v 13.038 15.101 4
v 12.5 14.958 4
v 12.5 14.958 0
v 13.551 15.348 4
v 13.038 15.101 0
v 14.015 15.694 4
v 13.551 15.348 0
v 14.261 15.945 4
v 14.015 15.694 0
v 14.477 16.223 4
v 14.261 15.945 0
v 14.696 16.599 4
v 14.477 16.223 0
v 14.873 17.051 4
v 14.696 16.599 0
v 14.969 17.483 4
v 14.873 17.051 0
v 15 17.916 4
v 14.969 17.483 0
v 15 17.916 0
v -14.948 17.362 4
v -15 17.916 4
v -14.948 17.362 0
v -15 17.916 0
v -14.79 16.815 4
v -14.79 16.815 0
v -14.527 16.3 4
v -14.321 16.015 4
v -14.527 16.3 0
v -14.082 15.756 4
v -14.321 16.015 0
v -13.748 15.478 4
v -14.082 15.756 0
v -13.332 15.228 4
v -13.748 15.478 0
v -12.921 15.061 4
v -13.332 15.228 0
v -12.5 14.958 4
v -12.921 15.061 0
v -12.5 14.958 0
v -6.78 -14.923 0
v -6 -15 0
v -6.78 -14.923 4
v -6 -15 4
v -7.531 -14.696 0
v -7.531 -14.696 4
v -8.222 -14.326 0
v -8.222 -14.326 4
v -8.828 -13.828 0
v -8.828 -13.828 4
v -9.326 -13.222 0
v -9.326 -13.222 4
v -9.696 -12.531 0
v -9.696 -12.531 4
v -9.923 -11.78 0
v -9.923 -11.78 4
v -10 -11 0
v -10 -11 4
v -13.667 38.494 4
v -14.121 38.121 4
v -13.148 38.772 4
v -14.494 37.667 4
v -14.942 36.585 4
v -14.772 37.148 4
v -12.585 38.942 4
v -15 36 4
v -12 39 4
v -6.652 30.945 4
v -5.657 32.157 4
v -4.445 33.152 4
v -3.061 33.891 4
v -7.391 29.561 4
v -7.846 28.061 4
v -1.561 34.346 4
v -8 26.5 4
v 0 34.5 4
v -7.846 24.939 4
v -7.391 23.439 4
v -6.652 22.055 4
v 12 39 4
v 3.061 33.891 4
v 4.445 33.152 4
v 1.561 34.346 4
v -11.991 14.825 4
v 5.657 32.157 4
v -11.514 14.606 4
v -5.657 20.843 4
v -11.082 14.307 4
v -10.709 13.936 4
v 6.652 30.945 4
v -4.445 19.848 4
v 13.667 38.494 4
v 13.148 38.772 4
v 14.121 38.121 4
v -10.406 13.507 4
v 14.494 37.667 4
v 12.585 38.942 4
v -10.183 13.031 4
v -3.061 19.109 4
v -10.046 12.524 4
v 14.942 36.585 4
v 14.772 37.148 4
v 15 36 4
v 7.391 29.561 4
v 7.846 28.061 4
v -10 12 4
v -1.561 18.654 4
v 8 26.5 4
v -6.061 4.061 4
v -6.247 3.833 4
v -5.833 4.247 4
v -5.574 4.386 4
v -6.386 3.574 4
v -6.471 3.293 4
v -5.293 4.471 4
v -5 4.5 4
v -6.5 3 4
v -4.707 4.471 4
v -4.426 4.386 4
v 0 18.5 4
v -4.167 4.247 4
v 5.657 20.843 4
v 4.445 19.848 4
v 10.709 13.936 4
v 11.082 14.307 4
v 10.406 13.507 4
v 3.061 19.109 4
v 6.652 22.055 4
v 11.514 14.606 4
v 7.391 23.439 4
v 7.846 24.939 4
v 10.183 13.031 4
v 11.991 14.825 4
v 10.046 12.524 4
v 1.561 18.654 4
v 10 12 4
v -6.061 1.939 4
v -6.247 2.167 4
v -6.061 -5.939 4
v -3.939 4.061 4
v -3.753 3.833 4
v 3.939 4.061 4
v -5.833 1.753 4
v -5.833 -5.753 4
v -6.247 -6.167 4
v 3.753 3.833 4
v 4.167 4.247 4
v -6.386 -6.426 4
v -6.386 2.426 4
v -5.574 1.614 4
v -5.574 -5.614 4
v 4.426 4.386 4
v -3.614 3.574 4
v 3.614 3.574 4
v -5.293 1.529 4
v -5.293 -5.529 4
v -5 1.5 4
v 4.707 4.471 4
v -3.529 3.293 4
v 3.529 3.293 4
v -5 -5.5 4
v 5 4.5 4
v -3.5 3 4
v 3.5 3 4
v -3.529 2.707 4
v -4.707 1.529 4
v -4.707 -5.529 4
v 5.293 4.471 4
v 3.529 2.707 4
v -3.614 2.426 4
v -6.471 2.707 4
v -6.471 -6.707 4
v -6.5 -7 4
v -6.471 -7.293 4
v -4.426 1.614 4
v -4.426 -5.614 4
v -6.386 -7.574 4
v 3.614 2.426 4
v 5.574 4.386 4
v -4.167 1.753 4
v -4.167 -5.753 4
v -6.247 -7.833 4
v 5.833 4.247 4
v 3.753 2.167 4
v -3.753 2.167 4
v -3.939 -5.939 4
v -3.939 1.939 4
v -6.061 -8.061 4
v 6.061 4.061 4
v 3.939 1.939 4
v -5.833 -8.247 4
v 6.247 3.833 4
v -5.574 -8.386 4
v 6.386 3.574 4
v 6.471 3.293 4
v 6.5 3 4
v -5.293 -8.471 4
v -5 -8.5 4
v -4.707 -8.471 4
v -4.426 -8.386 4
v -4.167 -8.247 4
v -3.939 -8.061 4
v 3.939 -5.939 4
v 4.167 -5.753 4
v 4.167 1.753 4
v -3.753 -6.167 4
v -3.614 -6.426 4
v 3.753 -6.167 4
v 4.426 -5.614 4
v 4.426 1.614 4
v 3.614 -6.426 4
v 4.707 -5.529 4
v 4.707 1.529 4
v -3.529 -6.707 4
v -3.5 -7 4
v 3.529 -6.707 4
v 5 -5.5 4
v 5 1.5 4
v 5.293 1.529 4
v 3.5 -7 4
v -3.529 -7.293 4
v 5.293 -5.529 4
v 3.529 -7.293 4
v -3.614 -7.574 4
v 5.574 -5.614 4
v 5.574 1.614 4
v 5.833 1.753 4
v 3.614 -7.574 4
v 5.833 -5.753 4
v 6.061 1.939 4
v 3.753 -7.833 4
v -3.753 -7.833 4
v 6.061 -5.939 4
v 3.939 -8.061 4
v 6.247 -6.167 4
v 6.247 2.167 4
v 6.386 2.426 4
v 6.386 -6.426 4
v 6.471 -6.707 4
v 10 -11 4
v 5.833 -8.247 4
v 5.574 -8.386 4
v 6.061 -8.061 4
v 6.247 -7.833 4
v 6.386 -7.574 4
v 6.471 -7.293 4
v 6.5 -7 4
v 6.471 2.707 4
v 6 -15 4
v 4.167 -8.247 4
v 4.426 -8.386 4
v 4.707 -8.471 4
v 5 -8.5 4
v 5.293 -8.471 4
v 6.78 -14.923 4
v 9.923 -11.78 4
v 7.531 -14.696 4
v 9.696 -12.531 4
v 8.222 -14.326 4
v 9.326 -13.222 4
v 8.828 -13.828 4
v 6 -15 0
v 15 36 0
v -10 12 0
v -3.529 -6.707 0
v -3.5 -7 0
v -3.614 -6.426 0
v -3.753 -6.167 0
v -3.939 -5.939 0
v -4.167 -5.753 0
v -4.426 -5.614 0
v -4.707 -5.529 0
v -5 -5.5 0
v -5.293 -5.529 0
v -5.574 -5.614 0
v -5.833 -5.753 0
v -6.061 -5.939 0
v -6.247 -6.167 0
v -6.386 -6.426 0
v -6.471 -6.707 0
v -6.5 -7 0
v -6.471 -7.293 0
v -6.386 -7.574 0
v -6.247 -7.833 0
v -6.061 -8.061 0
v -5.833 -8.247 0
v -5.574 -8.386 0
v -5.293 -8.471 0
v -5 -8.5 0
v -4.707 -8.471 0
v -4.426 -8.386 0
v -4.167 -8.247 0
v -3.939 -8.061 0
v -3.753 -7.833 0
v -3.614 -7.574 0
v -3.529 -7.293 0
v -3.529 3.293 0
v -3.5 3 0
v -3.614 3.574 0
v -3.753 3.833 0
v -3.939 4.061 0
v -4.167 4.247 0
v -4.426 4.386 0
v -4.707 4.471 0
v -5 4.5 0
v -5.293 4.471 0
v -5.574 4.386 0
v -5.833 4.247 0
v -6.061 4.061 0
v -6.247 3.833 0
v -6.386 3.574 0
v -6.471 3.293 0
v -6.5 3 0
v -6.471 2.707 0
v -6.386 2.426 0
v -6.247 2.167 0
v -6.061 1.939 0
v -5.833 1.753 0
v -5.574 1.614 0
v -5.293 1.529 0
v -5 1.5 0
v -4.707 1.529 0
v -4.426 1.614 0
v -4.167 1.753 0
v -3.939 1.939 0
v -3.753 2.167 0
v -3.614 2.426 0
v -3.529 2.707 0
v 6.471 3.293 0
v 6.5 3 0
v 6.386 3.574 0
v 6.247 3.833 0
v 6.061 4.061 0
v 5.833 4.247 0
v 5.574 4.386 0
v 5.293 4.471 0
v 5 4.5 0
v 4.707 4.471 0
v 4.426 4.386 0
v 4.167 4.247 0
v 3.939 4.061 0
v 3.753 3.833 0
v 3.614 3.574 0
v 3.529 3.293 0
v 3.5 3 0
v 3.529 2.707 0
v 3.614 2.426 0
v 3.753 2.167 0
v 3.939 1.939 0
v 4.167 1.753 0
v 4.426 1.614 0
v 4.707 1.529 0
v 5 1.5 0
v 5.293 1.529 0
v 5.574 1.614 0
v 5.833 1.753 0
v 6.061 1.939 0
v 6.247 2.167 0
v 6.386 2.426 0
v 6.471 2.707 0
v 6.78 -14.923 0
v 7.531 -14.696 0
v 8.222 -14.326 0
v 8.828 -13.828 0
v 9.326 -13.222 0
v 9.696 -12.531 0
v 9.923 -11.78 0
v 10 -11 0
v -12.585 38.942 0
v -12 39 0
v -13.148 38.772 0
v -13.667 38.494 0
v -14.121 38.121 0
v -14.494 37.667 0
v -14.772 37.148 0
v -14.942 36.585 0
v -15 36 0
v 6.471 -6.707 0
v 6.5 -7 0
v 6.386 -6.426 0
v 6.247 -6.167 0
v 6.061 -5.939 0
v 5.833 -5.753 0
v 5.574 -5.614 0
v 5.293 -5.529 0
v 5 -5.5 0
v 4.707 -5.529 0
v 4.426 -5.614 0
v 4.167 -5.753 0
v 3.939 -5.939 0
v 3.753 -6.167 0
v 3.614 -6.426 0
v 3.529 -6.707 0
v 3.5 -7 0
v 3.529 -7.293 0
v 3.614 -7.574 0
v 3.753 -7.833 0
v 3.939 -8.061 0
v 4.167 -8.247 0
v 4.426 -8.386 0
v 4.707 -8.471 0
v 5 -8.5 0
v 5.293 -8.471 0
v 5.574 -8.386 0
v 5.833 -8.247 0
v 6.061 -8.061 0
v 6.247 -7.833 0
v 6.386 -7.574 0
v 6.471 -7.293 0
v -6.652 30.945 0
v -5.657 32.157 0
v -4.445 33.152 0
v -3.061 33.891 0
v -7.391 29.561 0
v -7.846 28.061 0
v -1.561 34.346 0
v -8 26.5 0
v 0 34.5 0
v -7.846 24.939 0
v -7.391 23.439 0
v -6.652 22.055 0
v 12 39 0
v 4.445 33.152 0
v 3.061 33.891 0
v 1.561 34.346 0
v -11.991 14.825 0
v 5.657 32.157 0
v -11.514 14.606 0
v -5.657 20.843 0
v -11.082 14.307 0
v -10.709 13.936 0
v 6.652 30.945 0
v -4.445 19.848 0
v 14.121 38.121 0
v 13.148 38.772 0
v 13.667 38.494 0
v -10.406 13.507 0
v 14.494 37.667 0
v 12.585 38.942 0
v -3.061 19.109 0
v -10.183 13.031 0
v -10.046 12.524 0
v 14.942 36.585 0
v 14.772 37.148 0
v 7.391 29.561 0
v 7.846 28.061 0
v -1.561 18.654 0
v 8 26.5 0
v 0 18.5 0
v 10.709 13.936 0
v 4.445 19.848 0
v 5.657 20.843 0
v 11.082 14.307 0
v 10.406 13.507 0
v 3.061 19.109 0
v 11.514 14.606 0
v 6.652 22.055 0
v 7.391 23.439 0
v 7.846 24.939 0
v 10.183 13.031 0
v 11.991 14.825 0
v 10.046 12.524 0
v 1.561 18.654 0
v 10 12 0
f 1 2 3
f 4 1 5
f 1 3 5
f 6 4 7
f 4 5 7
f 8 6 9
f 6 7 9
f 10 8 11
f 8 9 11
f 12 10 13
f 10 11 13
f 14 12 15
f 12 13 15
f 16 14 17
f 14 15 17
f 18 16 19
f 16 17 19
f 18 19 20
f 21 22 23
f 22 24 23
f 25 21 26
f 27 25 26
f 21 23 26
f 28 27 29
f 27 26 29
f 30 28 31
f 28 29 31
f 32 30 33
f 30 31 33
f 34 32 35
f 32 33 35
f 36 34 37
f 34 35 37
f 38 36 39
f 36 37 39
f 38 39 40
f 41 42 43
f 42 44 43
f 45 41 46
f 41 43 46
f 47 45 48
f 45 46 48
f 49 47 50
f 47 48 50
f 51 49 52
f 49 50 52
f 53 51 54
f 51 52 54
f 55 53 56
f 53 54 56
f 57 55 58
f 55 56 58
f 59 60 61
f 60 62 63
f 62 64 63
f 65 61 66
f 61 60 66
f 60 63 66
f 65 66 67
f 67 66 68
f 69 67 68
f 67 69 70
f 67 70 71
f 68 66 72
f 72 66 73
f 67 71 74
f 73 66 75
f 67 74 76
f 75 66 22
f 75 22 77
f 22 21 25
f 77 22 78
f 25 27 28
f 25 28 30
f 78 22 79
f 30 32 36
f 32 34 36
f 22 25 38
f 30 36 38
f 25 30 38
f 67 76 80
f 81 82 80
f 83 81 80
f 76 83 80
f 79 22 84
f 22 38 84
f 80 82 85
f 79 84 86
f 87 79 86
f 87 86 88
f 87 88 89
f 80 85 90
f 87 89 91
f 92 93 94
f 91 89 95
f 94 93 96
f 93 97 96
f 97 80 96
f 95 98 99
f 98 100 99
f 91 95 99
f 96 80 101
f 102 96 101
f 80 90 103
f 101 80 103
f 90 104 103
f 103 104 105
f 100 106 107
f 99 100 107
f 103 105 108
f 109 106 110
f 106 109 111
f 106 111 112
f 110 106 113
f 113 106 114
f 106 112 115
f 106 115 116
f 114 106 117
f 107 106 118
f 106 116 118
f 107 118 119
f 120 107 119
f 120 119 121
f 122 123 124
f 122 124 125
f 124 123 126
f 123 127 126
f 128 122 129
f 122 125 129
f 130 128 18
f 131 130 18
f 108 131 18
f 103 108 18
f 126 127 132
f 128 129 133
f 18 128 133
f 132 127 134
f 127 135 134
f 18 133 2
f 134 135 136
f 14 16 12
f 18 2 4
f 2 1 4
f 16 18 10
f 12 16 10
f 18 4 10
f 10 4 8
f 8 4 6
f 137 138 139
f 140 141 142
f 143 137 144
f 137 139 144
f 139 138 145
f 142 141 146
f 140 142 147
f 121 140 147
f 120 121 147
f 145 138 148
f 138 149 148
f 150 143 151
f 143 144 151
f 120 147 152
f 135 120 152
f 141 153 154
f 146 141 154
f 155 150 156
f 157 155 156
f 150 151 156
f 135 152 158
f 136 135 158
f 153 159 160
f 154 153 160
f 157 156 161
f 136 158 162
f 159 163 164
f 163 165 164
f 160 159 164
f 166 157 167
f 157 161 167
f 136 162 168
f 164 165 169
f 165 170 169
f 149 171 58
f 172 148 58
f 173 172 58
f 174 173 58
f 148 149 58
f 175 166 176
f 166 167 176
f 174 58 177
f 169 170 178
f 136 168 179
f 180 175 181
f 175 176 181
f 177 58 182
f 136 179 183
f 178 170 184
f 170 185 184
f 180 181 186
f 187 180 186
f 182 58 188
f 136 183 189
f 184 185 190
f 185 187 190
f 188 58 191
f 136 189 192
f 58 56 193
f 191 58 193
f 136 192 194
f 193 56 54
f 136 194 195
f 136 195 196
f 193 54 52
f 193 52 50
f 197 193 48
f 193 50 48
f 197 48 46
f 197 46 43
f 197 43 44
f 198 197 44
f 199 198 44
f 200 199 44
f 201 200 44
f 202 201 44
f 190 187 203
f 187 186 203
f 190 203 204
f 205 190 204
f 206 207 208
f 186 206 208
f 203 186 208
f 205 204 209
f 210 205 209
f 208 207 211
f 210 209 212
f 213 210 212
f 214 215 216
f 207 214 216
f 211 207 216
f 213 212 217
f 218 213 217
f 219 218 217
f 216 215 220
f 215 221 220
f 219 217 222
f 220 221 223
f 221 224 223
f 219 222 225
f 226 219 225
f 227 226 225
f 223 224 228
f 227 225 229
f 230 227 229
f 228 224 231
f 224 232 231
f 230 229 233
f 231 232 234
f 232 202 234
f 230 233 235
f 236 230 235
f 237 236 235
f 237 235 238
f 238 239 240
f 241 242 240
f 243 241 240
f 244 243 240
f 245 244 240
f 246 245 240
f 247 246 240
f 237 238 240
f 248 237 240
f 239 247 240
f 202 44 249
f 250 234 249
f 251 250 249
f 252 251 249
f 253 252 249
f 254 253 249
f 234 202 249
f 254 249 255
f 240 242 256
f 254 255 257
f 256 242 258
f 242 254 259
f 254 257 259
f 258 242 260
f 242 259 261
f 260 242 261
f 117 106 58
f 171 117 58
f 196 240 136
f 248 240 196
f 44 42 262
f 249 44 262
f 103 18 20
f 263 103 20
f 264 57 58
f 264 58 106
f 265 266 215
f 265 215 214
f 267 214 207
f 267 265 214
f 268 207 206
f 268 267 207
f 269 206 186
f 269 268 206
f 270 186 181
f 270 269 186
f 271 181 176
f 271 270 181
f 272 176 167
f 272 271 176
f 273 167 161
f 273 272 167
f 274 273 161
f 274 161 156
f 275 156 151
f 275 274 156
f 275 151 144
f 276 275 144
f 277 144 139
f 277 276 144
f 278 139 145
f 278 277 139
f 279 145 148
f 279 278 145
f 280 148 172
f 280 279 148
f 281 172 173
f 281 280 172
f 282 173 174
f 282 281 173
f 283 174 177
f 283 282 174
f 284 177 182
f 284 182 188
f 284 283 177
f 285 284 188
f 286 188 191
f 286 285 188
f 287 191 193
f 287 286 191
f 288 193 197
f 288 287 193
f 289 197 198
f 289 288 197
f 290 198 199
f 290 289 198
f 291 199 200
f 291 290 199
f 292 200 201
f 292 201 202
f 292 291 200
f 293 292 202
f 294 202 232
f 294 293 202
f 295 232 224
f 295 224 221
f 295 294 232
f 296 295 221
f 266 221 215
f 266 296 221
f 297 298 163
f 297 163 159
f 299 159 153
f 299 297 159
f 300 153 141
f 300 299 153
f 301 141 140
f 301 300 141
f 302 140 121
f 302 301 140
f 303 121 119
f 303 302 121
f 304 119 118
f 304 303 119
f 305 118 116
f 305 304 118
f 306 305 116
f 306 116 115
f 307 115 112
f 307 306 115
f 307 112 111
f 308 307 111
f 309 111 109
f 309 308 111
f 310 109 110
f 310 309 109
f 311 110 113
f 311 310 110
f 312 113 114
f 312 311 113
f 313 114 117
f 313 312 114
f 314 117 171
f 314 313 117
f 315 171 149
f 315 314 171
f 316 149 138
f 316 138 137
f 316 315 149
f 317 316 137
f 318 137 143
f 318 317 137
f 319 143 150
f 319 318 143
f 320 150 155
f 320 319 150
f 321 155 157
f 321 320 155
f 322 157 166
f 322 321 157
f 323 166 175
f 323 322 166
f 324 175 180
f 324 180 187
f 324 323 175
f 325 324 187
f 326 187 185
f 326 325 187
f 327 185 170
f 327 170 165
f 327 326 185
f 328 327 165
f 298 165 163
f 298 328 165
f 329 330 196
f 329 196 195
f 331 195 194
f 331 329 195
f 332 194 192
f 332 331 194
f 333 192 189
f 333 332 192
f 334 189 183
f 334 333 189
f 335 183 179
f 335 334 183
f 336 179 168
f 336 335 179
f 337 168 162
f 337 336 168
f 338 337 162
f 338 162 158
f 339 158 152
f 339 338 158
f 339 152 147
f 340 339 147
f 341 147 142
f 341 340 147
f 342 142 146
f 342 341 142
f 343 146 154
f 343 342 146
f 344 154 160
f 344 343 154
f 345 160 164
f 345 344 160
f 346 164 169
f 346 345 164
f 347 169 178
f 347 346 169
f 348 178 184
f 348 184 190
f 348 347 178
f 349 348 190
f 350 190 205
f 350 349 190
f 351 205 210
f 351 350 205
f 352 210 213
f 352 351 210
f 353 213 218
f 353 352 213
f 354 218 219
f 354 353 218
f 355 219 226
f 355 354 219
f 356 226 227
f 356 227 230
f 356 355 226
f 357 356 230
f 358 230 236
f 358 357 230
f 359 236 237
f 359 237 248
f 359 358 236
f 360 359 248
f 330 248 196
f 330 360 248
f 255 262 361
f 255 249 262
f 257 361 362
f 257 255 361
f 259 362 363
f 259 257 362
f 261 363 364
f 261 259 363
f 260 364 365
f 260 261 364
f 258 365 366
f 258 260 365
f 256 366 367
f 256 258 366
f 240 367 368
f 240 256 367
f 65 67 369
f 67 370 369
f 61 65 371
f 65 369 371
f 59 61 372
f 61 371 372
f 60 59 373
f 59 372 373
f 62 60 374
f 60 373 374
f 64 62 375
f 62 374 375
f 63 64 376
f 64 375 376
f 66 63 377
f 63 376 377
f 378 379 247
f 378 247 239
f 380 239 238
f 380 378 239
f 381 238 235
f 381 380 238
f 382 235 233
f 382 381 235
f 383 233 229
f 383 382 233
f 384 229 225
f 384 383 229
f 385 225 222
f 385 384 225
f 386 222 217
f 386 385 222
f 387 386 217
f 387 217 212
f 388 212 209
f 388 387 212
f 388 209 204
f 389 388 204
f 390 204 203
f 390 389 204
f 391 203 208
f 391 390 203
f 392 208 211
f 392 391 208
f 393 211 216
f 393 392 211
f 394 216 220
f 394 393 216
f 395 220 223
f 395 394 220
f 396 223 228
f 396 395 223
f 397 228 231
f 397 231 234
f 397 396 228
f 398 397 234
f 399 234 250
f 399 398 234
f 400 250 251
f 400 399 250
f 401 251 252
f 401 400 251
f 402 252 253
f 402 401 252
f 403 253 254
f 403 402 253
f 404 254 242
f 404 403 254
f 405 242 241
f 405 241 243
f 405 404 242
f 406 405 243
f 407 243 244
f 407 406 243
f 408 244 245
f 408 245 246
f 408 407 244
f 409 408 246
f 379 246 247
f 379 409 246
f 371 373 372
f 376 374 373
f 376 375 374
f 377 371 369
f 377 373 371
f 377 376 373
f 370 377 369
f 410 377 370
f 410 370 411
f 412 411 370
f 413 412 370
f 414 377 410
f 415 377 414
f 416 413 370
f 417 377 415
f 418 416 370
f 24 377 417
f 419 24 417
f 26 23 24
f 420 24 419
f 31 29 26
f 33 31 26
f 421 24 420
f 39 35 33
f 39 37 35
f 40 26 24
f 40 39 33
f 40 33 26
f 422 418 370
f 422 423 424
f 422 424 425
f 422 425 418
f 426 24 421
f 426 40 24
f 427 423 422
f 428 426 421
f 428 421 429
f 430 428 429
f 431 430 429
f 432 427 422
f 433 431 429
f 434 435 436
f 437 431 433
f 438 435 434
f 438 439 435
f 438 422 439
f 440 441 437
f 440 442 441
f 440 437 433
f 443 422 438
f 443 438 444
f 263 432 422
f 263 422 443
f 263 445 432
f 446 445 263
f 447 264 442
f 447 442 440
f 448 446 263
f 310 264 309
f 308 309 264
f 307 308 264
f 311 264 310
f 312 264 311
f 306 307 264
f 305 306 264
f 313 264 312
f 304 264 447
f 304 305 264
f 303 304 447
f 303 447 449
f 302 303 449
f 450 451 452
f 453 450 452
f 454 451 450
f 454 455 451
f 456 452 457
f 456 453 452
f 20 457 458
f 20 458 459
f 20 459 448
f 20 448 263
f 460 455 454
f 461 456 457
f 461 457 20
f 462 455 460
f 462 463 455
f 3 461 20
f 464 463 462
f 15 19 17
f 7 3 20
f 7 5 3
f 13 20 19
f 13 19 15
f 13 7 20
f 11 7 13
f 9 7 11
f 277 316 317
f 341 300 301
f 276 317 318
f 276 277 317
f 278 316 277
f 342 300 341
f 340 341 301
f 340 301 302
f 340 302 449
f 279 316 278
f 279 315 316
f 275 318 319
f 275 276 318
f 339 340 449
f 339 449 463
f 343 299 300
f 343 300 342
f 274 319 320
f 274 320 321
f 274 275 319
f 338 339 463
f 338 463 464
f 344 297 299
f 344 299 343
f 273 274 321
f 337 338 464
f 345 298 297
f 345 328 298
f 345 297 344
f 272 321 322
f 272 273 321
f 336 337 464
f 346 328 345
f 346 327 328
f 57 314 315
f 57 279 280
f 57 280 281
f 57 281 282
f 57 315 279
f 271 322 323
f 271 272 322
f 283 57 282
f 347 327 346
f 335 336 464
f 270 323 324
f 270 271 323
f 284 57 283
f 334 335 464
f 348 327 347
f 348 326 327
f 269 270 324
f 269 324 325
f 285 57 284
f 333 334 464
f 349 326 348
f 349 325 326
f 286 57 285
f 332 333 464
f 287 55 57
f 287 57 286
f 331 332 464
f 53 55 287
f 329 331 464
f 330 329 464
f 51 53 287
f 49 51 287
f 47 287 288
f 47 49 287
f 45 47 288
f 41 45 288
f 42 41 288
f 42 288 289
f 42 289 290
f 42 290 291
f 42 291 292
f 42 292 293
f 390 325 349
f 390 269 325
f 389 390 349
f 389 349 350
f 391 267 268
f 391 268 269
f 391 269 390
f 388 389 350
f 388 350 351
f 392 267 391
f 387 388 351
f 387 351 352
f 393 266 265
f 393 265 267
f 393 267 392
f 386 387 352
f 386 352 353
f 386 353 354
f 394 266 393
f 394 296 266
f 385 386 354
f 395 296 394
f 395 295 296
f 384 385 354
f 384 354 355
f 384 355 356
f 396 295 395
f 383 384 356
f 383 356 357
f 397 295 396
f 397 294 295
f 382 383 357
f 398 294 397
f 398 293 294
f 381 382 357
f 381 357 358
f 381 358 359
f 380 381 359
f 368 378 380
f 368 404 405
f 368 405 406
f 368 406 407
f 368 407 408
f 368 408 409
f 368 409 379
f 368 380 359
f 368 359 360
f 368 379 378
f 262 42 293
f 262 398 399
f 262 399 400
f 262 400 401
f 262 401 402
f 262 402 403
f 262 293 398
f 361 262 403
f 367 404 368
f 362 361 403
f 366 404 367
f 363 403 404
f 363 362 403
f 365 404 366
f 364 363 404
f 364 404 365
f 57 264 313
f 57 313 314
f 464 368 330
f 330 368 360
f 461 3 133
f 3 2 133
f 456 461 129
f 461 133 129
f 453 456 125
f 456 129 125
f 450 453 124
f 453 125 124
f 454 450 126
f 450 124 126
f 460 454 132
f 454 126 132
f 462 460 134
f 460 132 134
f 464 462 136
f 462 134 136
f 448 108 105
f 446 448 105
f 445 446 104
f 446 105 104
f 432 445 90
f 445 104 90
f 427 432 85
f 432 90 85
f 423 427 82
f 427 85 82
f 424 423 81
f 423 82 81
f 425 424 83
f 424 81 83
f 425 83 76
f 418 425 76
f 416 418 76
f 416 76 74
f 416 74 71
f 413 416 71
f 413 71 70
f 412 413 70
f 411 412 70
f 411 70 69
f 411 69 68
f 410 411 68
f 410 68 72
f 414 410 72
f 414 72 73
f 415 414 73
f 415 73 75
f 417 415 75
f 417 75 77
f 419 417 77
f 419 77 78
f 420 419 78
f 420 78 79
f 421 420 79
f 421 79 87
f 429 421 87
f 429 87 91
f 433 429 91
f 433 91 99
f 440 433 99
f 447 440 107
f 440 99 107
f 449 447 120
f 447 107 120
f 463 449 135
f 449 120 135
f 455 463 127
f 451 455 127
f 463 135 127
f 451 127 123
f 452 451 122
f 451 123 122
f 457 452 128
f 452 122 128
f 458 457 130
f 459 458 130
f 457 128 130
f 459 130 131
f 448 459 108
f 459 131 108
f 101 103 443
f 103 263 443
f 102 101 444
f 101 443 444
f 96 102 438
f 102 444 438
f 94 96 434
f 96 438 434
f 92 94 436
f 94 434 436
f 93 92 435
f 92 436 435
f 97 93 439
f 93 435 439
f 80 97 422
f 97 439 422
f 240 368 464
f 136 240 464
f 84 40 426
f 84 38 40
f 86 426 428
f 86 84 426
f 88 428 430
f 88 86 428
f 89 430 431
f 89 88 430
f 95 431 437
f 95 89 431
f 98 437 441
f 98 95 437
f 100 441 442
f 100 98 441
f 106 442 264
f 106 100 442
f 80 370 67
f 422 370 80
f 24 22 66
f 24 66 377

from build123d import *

# Parameters (mm, degrees)
SKETCH_1_W          = 20
SKETCH_1_H          = 30
SKETCH_1_R          = 1.5
EXTRUDE_1_DEPTH     = 4
SKETCH_2_W          = 30
SKETCH_2_H          = 4
EXTRUDE_2_DEPTH     = 24
FILLET_1_R          = 3
SKETCH_3_R          = 8
CUT_EXTRUDE_1_DEPTH = 24
FILLET_2_R          = 3
FILLET_3_R          = 4
FILLET_4_R          = 4


with BuildPart() as part:
    # 草图1 → 凸台-拉伸1 (new body)
    with BuildSketch(Plane.XY):
        Rectangle(SKETCH_1_W, SKETCH_1_H)
        with Locations((-5, 3)):
            Circle(SKETCH_1_R, mode=Mode.SUBTRACT)
        with Locations((5, 3)):
            Circle(SKETCH_1_R, mode=Mode.SUBTRACT)
        with Locations((-5, -7)):
            Circle(SKETCH_1_R, mode=Mode.SUBTRACT)
        with Locations((5, -7)):
            Circle(SKETCH_1_R, mode=Mode.SUBTRACT)
    extrude(amount=EXTRUDE_1_DEPTH)

    # 草图2 → 凸台-拉伸2 (add)
    with BuildSketch(Plane(origin=(0, 15, 0), x_dir=(1, 0, 0), z_dir=(0, 1, 0))):
        with Locations((0, -2)):
            Rectangle(SKETCH_2_W, SKETCH_2_H)
    extrude(amount=EXTRUDE_2_DEPTH)

    # 圆角1
    fillet_1_edges = [part.edges().sort_by_distance(p)[0] for p in [
        (-10, 15, 2),
        (10, 15, 2),
    ]]
    fillet(fillet_1_edges, radius=FILLET_1_R)

    # 草图3 → 切除-拉伸1 (cut)
    with BuildSketch(Plane.XY.offset(4)):
        with Locations((0, 26.5)):
            Circle(SKETCH_3_R)
    extrude(amount=-CUT_EXTRUDE_1_DEPTH, mode=Mode.SUBTRACT)

    # 圆角2
    fillet_2_edges = [part.edges().sort_by_distance(p)[0] for p in [
        (15, 15, 2),
        (15, 39, 2),
        (-15, 39, 2),
        (-15, 15, 2),
    ]]
    fillet(fillet_2_edges, radius=FILLET_2_R)

    # 圆角3
    fillet_3_edges = [part.edges().sort_by_distance(p)[0] for p in [
        (-10, -15, 2),
    ]]
    fillet(fillet_3_edges, radius=FILLET_3_R)

    # 圆角4
    fillet_4_edges = [part.edges().sort_by_distance(p)[0] for p in [
        (10, -15, 2),
    ]]
    fillet(fillet_4_edges, radius=FILLET_4_R)


solid = part.part
